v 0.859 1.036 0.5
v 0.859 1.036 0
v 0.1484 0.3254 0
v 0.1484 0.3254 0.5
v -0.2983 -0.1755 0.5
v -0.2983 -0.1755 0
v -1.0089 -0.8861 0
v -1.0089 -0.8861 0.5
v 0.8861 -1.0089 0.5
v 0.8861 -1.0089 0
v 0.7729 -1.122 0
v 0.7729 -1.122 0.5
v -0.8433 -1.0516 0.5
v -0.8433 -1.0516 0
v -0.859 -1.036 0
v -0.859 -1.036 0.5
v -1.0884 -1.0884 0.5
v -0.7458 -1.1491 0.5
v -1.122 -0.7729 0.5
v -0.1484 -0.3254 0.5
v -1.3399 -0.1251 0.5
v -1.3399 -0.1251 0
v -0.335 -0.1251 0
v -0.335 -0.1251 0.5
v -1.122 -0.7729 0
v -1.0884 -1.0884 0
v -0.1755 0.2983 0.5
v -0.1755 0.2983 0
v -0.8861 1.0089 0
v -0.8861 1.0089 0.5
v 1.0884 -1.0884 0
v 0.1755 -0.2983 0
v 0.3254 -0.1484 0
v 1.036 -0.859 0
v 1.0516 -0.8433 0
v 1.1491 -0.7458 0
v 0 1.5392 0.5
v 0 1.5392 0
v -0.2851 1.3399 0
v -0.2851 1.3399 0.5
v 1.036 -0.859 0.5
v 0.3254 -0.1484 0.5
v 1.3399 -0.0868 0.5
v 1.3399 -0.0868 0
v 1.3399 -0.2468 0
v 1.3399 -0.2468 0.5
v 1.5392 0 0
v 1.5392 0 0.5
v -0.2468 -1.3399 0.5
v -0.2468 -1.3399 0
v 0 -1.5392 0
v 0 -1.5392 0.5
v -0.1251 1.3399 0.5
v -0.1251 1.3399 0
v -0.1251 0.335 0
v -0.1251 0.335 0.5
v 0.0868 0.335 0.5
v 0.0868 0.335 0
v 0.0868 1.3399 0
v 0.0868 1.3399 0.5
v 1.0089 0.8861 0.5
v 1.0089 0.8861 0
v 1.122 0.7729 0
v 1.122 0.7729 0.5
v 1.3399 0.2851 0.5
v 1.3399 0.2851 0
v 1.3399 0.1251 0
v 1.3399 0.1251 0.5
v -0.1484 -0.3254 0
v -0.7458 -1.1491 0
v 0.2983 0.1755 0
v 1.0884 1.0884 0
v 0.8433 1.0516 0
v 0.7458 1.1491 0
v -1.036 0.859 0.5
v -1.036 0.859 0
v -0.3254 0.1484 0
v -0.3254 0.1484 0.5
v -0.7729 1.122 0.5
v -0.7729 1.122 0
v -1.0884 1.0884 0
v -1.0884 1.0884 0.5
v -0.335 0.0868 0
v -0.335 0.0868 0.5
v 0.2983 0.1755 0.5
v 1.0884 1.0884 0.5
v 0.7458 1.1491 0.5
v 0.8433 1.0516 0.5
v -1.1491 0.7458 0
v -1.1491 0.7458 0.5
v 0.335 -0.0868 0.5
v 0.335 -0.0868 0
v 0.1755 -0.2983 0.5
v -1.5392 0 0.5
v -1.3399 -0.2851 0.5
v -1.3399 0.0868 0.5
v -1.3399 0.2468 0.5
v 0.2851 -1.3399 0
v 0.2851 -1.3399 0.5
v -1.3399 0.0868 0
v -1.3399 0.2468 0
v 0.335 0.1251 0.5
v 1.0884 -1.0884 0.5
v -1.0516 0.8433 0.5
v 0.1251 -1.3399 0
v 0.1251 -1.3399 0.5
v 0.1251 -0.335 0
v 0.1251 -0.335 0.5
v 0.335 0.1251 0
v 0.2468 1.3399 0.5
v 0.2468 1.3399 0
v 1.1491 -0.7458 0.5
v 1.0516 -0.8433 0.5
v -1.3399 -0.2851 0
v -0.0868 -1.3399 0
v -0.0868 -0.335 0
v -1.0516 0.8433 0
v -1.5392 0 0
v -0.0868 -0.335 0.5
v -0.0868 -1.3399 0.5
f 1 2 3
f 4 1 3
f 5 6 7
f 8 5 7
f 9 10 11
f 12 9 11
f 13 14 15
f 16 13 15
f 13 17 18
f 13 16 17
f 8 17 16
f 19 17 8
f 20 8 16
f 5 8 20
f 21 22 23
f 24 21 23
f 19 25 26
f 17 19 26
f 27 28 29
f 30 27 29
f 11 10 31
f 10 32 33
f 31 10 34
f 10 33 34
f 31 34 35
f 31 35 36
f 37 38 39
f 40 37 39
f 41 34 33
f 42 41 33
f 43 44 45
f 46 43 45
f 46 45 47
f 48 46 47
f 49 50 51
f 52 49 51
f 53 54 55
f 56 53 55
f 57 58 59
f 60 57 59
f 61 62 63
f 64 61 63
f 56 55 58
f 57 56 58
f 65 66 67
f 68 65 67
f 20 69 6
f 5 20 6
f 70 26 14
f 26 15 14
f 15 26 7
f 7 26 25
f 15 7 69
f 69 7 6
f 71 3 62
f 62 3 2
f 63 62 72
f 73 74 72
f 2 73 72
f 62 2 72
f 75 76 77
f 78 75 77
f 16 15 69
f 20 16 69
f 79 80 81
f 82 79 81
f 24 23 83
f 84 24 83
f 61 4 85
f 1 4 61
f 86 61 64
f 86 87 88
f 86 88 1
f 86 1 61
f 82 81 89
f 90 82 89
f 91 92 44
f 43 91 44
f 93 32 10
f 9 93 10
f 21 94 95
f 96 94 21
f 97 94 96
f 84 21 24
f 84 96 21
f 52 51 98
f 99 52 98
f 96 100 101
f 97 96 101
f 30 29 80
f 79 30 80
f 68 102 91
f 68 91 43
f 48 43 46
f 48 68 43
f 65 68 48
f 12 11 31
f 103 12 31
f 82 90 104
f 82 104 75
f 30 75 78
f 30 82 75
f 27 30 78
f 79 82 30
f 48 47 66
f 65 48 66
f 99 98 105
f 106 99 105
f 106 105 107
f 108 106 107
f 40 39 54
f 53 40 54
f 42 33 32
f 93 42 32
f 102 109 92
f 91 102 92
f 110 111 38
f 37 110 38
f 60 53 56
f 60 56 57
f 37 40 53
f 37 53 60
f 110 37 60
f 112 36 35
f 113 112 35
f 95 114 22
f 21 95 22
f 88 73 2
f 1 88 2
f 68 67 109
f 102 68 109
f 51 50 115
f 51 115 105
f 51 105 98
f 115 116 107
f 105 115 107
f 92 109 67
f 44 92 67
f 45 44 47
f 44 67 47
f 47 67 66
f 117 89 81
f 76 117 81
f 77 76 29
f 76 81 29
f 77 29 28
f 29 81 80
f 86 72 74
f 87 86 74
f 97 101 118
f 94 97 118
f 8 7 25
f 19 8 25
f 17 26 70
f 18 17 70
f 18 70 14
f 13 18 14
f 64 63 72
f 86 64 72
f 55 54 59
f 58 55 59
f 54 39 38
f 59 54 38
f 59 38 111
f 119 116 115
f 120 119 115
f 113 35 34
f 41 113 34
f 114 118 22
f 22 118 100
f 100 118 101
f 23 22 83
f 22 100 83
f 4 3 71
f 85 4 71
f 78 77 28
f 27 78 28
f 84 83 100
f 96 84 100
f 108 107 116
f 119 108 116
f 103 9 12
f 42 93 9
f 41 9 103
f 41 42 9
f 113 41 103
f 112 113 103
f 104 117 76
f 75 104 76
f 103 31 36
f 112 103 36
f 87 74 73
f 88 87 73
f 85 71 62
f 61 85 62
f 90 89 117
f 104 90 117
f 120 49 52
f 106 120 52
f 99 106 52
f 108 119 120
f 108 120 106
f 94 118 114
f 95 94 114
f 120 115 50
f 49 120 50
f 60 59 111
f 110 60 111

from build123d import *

# Parameters (mm, degrees)
F1_DEPTH = 0.5


# Not quite as in the source:
# - a feature names something its author has since deleted; it is built from what else it names


with BuildPart() as f1:
    # F0 (on Top) → F1 (new body)
    with BuildSketch(Plane.XY):
        Polygon((-1.3399171252, 0.0368332625), (-1.3399171252, -0.0368332625), (-1.3399171252, -0.125143673), (-0.3350383195, -0.125143673), (-0.3350383195, -0.0368332625), (-0.3350383195, 0.0368332625), (-0.3350383195, 0.0868332625), (-1.3399171252, 0.0868332625), align=None)
        Polygon((-1.3399171252, -0.125143673), (-1.3399171252, -0.0368332625), (-1.3399171252, 0.0368332625), (-1.3399171252, 0.0868332625), (-1.3399171252, 0.14733305), (-1.3399171252, 0.2468332625), (-1.5391977504, 0), (-1.3399171252, -0.285143673), (-1.3399171252, -0.14733305), align=None)
    extrude(amount=F1_DEPTH)


with BuildPart() as f1b:
    # F0 (on Top) → F1, piece 2 (new body)
    with BuildSketch(Plane.XY):
        Polygon((-0.1755074789, 0.2983082564), (-0.8860640967, 1.0088648742), (-0.9214194358, 0.9735095352), (-0.9735095352, 0.9214194358), (-1.0359544253, 0.8589745457), (-0.3253978074, 0.1484179279), (-0.2629529173, 0.210862818), (-0.210862818, 0.2629529173), align=None)
        Polygon((-0.9214194358, 0.9735095352), (-0.8860640967, 1.0088648742), (-0.8432842867, 1.0516446842), (-0.7729270117, 1.1220019592), (-1.0883771669, 1.0883771669), (-1.1490915102, 0.7458374607), (-1.0516446842, 0.8432842867), (-1.0359544253, 0.8589745457), (-0.9735095352, 0.9214194358), align=None)
    extrude(amount=F1_DEPTH)


with BuildPart() as f1c:
    # F0 (on Top) → F1, piece 3 (new body)
    with BuildSketch(Plane.XY):
        Polygon((0.0368332625, 1.3399171252), (0.0868332625, 1.3399171252), (0.14733305, 1.3399171252), (0.2468332625, 1.3399171252), (0, 1.5391977504), (-0.285143673, 1.3399171252), (-0.14733305, 1.3399171252), (-0.125143673, 1.3399171252), (-0.0368332625, 1.3399171252), align=None)
        Polygon((0.0868332625, 0.3350383195), (0.0868332625, 1.3399171252), (0.0368332625, 1.3399171252), (-0.0368332625, 1.3399171252), (-0.125143673, 1.3399171252), (-0.125143673, 0.3350383195), (-0.0368332625, 0.3350383195), (0.0368332625, 0.3350383195), align=None)
    extrude(amount=F1_DEPTH)


with BuildPart() as f1d:
    # F0 (on Top) → F1, piece 4 (new body)
    with BuildSketch(Plane.XY):
        Polygon((0.2983082564, 0.1755074789), (1.0088648742, 0.8860640967), (0.9735095352, 0.9214194358), (0.9214194358, 0.9735095352), (0.8589745457, 1.0359544253), (0.1484179279, 0.3253978074), (0.210862818, 0.2629529173), (0.2629529173, 0.210862818), align=None)
        Polygon((0.9735095352, 0.9214194358), (1.0088648742, 0.8860640967), (1.0516446842, 0.8432842867), (1.1220019592, 0.7729270117), (1.0883771669, 1.0883771669), (0.7458374607, 1.1490915102), (0.8432842867, 1.0516446842), (0.8589745457, 1.0359544253), (0.9214194358, 0.9735095352), align=None)
    extrude(amount=F1_DEPTH)


with BuildPart() as f1e:
    # F0 (on Top) → F1, piece 5 (new body)
    with BuildSketch(Plane.XY):
        Polygon((1.3399171252, -0.0368332625), (1.3399171252, -0.0868332625), (1.3399171252, -0.14733305), (1.3399171252, -0.2468332625), (1.5391977504, 0), (1.3399171252, 0.285143673), (1.3399171252, 0.14733305), (1.3399171252, 0.125143673), (1.3399171252, 0.0368332625), align=None)
        Polygon((0.3350383195, -0.0868332625), (1.3399171252, -0.0868332625), (1.3399171252, -0.0368332625), (1.3399171252, 0.0368332625), (1.3399171252, 0.125143673), (0.3350383195, 0.125143673), (0.3350383195, 0.0368332625), (0.3350383195, -0.0368332625), align=None)
    extrude(amount=F1_DEPTH)


with BuildPart() as f1f:
    # F0 (on Top) → F1, piece 6 (new body)
    with BuildSketch(Plane.XY):
        Polygon((0.1755074789, -0.2983082564), (0.8860640967, -1.0088648742), (0.9214194358, -0.9735095352), (0.9735095352, -0.9214194358), (1.0359544253, -0.8589745457), (0.3253978074, -0.1484179279), (0.2629529173, -0.210862818), (0.210862818, -0.2629529173), align=None)
        Polygon((0.9214194358, -0.9735095352), (0.8860640967, -1.0088648742), (0.8432842867, -1.0516446842), (0.7729270117, -1.1220019592), (1.0883771669, -1.0883771669), (1.1490915102, -0.7458374607), (1.0516446842, -0.8432842867), (1.0359544253, -0.8589745457), (0.9735095352, -0.9214194358), align=None)
    extrude(amount=F1_DEPTH)


with BuildPart() as f1g:
    # F0 (on Top) → F1, piece 7 (new body)
    with BuildSketch(Plane.XY):
        Polygon((-0.0868332625, -0.3350383195), (-0.0868332625, -1.3399171252), (-0.0368332625, -1.3399171252), (0.0368332625, -1.3399171252), (0.125143673, -1.3399171252), (0.125143673, -0.3350383195), (0.0368332625, -0.3350383195), (-0.0368332625, -0.3350383195), align=None)
        Polygon((-0.14733305, -1.3399171252), (-0.2468332625, -1.3399171252), (0, -1.5391977504), (0.285143673, -1.3399171252), (0.14733305, -1.3399171252), (0.125143673, -1.3399171252), (0.0368332625, -1.3399171252), (-0.0368332625, -1.3399171252), (-0.0868332625, -1.3399171252), align=None)
    extrude(amount=F1_DEPTH)


with BuildPart() as f1h:
    # F0 (on Top) → F1, piece 8 (new body)
    with BuildSketch(Plane.XY):
        Polygon((-1.0516446842, -0.8432842867), (-1.1220019592, -0.7729270117), (-1.0883771669, -1.0883771669), (-0.7458374607, -1.1490915102), (-0.8432842867, -1.0516446842), (-0.8589745457, -1.0359544253), (-0.9214194358, -0.9735095352), (-0.9735095352, -0.9214194358), (-1.0088648742, -0.8860640967), align=None)
        Polygon((-0.2983082564, -0.1755074789), (-1.0088648742, -0.8860640967), (-0.9735095352, -0.9214194358), (-0.9214194358, -0.9735095352), (-0.8589745457, -1.0359544253), (-0.1484179279, -0.3253978074), (-0.210862818, -0.2629529173), (-0.2629529173, -0.210862818), align=None)
    extrude(amount=F1_DEPTH)


solid = Compound([f1.part, f1b.part, f1c.part, f1d.part, f1e.part, f1f.part, f1g.part, f1h.part])
